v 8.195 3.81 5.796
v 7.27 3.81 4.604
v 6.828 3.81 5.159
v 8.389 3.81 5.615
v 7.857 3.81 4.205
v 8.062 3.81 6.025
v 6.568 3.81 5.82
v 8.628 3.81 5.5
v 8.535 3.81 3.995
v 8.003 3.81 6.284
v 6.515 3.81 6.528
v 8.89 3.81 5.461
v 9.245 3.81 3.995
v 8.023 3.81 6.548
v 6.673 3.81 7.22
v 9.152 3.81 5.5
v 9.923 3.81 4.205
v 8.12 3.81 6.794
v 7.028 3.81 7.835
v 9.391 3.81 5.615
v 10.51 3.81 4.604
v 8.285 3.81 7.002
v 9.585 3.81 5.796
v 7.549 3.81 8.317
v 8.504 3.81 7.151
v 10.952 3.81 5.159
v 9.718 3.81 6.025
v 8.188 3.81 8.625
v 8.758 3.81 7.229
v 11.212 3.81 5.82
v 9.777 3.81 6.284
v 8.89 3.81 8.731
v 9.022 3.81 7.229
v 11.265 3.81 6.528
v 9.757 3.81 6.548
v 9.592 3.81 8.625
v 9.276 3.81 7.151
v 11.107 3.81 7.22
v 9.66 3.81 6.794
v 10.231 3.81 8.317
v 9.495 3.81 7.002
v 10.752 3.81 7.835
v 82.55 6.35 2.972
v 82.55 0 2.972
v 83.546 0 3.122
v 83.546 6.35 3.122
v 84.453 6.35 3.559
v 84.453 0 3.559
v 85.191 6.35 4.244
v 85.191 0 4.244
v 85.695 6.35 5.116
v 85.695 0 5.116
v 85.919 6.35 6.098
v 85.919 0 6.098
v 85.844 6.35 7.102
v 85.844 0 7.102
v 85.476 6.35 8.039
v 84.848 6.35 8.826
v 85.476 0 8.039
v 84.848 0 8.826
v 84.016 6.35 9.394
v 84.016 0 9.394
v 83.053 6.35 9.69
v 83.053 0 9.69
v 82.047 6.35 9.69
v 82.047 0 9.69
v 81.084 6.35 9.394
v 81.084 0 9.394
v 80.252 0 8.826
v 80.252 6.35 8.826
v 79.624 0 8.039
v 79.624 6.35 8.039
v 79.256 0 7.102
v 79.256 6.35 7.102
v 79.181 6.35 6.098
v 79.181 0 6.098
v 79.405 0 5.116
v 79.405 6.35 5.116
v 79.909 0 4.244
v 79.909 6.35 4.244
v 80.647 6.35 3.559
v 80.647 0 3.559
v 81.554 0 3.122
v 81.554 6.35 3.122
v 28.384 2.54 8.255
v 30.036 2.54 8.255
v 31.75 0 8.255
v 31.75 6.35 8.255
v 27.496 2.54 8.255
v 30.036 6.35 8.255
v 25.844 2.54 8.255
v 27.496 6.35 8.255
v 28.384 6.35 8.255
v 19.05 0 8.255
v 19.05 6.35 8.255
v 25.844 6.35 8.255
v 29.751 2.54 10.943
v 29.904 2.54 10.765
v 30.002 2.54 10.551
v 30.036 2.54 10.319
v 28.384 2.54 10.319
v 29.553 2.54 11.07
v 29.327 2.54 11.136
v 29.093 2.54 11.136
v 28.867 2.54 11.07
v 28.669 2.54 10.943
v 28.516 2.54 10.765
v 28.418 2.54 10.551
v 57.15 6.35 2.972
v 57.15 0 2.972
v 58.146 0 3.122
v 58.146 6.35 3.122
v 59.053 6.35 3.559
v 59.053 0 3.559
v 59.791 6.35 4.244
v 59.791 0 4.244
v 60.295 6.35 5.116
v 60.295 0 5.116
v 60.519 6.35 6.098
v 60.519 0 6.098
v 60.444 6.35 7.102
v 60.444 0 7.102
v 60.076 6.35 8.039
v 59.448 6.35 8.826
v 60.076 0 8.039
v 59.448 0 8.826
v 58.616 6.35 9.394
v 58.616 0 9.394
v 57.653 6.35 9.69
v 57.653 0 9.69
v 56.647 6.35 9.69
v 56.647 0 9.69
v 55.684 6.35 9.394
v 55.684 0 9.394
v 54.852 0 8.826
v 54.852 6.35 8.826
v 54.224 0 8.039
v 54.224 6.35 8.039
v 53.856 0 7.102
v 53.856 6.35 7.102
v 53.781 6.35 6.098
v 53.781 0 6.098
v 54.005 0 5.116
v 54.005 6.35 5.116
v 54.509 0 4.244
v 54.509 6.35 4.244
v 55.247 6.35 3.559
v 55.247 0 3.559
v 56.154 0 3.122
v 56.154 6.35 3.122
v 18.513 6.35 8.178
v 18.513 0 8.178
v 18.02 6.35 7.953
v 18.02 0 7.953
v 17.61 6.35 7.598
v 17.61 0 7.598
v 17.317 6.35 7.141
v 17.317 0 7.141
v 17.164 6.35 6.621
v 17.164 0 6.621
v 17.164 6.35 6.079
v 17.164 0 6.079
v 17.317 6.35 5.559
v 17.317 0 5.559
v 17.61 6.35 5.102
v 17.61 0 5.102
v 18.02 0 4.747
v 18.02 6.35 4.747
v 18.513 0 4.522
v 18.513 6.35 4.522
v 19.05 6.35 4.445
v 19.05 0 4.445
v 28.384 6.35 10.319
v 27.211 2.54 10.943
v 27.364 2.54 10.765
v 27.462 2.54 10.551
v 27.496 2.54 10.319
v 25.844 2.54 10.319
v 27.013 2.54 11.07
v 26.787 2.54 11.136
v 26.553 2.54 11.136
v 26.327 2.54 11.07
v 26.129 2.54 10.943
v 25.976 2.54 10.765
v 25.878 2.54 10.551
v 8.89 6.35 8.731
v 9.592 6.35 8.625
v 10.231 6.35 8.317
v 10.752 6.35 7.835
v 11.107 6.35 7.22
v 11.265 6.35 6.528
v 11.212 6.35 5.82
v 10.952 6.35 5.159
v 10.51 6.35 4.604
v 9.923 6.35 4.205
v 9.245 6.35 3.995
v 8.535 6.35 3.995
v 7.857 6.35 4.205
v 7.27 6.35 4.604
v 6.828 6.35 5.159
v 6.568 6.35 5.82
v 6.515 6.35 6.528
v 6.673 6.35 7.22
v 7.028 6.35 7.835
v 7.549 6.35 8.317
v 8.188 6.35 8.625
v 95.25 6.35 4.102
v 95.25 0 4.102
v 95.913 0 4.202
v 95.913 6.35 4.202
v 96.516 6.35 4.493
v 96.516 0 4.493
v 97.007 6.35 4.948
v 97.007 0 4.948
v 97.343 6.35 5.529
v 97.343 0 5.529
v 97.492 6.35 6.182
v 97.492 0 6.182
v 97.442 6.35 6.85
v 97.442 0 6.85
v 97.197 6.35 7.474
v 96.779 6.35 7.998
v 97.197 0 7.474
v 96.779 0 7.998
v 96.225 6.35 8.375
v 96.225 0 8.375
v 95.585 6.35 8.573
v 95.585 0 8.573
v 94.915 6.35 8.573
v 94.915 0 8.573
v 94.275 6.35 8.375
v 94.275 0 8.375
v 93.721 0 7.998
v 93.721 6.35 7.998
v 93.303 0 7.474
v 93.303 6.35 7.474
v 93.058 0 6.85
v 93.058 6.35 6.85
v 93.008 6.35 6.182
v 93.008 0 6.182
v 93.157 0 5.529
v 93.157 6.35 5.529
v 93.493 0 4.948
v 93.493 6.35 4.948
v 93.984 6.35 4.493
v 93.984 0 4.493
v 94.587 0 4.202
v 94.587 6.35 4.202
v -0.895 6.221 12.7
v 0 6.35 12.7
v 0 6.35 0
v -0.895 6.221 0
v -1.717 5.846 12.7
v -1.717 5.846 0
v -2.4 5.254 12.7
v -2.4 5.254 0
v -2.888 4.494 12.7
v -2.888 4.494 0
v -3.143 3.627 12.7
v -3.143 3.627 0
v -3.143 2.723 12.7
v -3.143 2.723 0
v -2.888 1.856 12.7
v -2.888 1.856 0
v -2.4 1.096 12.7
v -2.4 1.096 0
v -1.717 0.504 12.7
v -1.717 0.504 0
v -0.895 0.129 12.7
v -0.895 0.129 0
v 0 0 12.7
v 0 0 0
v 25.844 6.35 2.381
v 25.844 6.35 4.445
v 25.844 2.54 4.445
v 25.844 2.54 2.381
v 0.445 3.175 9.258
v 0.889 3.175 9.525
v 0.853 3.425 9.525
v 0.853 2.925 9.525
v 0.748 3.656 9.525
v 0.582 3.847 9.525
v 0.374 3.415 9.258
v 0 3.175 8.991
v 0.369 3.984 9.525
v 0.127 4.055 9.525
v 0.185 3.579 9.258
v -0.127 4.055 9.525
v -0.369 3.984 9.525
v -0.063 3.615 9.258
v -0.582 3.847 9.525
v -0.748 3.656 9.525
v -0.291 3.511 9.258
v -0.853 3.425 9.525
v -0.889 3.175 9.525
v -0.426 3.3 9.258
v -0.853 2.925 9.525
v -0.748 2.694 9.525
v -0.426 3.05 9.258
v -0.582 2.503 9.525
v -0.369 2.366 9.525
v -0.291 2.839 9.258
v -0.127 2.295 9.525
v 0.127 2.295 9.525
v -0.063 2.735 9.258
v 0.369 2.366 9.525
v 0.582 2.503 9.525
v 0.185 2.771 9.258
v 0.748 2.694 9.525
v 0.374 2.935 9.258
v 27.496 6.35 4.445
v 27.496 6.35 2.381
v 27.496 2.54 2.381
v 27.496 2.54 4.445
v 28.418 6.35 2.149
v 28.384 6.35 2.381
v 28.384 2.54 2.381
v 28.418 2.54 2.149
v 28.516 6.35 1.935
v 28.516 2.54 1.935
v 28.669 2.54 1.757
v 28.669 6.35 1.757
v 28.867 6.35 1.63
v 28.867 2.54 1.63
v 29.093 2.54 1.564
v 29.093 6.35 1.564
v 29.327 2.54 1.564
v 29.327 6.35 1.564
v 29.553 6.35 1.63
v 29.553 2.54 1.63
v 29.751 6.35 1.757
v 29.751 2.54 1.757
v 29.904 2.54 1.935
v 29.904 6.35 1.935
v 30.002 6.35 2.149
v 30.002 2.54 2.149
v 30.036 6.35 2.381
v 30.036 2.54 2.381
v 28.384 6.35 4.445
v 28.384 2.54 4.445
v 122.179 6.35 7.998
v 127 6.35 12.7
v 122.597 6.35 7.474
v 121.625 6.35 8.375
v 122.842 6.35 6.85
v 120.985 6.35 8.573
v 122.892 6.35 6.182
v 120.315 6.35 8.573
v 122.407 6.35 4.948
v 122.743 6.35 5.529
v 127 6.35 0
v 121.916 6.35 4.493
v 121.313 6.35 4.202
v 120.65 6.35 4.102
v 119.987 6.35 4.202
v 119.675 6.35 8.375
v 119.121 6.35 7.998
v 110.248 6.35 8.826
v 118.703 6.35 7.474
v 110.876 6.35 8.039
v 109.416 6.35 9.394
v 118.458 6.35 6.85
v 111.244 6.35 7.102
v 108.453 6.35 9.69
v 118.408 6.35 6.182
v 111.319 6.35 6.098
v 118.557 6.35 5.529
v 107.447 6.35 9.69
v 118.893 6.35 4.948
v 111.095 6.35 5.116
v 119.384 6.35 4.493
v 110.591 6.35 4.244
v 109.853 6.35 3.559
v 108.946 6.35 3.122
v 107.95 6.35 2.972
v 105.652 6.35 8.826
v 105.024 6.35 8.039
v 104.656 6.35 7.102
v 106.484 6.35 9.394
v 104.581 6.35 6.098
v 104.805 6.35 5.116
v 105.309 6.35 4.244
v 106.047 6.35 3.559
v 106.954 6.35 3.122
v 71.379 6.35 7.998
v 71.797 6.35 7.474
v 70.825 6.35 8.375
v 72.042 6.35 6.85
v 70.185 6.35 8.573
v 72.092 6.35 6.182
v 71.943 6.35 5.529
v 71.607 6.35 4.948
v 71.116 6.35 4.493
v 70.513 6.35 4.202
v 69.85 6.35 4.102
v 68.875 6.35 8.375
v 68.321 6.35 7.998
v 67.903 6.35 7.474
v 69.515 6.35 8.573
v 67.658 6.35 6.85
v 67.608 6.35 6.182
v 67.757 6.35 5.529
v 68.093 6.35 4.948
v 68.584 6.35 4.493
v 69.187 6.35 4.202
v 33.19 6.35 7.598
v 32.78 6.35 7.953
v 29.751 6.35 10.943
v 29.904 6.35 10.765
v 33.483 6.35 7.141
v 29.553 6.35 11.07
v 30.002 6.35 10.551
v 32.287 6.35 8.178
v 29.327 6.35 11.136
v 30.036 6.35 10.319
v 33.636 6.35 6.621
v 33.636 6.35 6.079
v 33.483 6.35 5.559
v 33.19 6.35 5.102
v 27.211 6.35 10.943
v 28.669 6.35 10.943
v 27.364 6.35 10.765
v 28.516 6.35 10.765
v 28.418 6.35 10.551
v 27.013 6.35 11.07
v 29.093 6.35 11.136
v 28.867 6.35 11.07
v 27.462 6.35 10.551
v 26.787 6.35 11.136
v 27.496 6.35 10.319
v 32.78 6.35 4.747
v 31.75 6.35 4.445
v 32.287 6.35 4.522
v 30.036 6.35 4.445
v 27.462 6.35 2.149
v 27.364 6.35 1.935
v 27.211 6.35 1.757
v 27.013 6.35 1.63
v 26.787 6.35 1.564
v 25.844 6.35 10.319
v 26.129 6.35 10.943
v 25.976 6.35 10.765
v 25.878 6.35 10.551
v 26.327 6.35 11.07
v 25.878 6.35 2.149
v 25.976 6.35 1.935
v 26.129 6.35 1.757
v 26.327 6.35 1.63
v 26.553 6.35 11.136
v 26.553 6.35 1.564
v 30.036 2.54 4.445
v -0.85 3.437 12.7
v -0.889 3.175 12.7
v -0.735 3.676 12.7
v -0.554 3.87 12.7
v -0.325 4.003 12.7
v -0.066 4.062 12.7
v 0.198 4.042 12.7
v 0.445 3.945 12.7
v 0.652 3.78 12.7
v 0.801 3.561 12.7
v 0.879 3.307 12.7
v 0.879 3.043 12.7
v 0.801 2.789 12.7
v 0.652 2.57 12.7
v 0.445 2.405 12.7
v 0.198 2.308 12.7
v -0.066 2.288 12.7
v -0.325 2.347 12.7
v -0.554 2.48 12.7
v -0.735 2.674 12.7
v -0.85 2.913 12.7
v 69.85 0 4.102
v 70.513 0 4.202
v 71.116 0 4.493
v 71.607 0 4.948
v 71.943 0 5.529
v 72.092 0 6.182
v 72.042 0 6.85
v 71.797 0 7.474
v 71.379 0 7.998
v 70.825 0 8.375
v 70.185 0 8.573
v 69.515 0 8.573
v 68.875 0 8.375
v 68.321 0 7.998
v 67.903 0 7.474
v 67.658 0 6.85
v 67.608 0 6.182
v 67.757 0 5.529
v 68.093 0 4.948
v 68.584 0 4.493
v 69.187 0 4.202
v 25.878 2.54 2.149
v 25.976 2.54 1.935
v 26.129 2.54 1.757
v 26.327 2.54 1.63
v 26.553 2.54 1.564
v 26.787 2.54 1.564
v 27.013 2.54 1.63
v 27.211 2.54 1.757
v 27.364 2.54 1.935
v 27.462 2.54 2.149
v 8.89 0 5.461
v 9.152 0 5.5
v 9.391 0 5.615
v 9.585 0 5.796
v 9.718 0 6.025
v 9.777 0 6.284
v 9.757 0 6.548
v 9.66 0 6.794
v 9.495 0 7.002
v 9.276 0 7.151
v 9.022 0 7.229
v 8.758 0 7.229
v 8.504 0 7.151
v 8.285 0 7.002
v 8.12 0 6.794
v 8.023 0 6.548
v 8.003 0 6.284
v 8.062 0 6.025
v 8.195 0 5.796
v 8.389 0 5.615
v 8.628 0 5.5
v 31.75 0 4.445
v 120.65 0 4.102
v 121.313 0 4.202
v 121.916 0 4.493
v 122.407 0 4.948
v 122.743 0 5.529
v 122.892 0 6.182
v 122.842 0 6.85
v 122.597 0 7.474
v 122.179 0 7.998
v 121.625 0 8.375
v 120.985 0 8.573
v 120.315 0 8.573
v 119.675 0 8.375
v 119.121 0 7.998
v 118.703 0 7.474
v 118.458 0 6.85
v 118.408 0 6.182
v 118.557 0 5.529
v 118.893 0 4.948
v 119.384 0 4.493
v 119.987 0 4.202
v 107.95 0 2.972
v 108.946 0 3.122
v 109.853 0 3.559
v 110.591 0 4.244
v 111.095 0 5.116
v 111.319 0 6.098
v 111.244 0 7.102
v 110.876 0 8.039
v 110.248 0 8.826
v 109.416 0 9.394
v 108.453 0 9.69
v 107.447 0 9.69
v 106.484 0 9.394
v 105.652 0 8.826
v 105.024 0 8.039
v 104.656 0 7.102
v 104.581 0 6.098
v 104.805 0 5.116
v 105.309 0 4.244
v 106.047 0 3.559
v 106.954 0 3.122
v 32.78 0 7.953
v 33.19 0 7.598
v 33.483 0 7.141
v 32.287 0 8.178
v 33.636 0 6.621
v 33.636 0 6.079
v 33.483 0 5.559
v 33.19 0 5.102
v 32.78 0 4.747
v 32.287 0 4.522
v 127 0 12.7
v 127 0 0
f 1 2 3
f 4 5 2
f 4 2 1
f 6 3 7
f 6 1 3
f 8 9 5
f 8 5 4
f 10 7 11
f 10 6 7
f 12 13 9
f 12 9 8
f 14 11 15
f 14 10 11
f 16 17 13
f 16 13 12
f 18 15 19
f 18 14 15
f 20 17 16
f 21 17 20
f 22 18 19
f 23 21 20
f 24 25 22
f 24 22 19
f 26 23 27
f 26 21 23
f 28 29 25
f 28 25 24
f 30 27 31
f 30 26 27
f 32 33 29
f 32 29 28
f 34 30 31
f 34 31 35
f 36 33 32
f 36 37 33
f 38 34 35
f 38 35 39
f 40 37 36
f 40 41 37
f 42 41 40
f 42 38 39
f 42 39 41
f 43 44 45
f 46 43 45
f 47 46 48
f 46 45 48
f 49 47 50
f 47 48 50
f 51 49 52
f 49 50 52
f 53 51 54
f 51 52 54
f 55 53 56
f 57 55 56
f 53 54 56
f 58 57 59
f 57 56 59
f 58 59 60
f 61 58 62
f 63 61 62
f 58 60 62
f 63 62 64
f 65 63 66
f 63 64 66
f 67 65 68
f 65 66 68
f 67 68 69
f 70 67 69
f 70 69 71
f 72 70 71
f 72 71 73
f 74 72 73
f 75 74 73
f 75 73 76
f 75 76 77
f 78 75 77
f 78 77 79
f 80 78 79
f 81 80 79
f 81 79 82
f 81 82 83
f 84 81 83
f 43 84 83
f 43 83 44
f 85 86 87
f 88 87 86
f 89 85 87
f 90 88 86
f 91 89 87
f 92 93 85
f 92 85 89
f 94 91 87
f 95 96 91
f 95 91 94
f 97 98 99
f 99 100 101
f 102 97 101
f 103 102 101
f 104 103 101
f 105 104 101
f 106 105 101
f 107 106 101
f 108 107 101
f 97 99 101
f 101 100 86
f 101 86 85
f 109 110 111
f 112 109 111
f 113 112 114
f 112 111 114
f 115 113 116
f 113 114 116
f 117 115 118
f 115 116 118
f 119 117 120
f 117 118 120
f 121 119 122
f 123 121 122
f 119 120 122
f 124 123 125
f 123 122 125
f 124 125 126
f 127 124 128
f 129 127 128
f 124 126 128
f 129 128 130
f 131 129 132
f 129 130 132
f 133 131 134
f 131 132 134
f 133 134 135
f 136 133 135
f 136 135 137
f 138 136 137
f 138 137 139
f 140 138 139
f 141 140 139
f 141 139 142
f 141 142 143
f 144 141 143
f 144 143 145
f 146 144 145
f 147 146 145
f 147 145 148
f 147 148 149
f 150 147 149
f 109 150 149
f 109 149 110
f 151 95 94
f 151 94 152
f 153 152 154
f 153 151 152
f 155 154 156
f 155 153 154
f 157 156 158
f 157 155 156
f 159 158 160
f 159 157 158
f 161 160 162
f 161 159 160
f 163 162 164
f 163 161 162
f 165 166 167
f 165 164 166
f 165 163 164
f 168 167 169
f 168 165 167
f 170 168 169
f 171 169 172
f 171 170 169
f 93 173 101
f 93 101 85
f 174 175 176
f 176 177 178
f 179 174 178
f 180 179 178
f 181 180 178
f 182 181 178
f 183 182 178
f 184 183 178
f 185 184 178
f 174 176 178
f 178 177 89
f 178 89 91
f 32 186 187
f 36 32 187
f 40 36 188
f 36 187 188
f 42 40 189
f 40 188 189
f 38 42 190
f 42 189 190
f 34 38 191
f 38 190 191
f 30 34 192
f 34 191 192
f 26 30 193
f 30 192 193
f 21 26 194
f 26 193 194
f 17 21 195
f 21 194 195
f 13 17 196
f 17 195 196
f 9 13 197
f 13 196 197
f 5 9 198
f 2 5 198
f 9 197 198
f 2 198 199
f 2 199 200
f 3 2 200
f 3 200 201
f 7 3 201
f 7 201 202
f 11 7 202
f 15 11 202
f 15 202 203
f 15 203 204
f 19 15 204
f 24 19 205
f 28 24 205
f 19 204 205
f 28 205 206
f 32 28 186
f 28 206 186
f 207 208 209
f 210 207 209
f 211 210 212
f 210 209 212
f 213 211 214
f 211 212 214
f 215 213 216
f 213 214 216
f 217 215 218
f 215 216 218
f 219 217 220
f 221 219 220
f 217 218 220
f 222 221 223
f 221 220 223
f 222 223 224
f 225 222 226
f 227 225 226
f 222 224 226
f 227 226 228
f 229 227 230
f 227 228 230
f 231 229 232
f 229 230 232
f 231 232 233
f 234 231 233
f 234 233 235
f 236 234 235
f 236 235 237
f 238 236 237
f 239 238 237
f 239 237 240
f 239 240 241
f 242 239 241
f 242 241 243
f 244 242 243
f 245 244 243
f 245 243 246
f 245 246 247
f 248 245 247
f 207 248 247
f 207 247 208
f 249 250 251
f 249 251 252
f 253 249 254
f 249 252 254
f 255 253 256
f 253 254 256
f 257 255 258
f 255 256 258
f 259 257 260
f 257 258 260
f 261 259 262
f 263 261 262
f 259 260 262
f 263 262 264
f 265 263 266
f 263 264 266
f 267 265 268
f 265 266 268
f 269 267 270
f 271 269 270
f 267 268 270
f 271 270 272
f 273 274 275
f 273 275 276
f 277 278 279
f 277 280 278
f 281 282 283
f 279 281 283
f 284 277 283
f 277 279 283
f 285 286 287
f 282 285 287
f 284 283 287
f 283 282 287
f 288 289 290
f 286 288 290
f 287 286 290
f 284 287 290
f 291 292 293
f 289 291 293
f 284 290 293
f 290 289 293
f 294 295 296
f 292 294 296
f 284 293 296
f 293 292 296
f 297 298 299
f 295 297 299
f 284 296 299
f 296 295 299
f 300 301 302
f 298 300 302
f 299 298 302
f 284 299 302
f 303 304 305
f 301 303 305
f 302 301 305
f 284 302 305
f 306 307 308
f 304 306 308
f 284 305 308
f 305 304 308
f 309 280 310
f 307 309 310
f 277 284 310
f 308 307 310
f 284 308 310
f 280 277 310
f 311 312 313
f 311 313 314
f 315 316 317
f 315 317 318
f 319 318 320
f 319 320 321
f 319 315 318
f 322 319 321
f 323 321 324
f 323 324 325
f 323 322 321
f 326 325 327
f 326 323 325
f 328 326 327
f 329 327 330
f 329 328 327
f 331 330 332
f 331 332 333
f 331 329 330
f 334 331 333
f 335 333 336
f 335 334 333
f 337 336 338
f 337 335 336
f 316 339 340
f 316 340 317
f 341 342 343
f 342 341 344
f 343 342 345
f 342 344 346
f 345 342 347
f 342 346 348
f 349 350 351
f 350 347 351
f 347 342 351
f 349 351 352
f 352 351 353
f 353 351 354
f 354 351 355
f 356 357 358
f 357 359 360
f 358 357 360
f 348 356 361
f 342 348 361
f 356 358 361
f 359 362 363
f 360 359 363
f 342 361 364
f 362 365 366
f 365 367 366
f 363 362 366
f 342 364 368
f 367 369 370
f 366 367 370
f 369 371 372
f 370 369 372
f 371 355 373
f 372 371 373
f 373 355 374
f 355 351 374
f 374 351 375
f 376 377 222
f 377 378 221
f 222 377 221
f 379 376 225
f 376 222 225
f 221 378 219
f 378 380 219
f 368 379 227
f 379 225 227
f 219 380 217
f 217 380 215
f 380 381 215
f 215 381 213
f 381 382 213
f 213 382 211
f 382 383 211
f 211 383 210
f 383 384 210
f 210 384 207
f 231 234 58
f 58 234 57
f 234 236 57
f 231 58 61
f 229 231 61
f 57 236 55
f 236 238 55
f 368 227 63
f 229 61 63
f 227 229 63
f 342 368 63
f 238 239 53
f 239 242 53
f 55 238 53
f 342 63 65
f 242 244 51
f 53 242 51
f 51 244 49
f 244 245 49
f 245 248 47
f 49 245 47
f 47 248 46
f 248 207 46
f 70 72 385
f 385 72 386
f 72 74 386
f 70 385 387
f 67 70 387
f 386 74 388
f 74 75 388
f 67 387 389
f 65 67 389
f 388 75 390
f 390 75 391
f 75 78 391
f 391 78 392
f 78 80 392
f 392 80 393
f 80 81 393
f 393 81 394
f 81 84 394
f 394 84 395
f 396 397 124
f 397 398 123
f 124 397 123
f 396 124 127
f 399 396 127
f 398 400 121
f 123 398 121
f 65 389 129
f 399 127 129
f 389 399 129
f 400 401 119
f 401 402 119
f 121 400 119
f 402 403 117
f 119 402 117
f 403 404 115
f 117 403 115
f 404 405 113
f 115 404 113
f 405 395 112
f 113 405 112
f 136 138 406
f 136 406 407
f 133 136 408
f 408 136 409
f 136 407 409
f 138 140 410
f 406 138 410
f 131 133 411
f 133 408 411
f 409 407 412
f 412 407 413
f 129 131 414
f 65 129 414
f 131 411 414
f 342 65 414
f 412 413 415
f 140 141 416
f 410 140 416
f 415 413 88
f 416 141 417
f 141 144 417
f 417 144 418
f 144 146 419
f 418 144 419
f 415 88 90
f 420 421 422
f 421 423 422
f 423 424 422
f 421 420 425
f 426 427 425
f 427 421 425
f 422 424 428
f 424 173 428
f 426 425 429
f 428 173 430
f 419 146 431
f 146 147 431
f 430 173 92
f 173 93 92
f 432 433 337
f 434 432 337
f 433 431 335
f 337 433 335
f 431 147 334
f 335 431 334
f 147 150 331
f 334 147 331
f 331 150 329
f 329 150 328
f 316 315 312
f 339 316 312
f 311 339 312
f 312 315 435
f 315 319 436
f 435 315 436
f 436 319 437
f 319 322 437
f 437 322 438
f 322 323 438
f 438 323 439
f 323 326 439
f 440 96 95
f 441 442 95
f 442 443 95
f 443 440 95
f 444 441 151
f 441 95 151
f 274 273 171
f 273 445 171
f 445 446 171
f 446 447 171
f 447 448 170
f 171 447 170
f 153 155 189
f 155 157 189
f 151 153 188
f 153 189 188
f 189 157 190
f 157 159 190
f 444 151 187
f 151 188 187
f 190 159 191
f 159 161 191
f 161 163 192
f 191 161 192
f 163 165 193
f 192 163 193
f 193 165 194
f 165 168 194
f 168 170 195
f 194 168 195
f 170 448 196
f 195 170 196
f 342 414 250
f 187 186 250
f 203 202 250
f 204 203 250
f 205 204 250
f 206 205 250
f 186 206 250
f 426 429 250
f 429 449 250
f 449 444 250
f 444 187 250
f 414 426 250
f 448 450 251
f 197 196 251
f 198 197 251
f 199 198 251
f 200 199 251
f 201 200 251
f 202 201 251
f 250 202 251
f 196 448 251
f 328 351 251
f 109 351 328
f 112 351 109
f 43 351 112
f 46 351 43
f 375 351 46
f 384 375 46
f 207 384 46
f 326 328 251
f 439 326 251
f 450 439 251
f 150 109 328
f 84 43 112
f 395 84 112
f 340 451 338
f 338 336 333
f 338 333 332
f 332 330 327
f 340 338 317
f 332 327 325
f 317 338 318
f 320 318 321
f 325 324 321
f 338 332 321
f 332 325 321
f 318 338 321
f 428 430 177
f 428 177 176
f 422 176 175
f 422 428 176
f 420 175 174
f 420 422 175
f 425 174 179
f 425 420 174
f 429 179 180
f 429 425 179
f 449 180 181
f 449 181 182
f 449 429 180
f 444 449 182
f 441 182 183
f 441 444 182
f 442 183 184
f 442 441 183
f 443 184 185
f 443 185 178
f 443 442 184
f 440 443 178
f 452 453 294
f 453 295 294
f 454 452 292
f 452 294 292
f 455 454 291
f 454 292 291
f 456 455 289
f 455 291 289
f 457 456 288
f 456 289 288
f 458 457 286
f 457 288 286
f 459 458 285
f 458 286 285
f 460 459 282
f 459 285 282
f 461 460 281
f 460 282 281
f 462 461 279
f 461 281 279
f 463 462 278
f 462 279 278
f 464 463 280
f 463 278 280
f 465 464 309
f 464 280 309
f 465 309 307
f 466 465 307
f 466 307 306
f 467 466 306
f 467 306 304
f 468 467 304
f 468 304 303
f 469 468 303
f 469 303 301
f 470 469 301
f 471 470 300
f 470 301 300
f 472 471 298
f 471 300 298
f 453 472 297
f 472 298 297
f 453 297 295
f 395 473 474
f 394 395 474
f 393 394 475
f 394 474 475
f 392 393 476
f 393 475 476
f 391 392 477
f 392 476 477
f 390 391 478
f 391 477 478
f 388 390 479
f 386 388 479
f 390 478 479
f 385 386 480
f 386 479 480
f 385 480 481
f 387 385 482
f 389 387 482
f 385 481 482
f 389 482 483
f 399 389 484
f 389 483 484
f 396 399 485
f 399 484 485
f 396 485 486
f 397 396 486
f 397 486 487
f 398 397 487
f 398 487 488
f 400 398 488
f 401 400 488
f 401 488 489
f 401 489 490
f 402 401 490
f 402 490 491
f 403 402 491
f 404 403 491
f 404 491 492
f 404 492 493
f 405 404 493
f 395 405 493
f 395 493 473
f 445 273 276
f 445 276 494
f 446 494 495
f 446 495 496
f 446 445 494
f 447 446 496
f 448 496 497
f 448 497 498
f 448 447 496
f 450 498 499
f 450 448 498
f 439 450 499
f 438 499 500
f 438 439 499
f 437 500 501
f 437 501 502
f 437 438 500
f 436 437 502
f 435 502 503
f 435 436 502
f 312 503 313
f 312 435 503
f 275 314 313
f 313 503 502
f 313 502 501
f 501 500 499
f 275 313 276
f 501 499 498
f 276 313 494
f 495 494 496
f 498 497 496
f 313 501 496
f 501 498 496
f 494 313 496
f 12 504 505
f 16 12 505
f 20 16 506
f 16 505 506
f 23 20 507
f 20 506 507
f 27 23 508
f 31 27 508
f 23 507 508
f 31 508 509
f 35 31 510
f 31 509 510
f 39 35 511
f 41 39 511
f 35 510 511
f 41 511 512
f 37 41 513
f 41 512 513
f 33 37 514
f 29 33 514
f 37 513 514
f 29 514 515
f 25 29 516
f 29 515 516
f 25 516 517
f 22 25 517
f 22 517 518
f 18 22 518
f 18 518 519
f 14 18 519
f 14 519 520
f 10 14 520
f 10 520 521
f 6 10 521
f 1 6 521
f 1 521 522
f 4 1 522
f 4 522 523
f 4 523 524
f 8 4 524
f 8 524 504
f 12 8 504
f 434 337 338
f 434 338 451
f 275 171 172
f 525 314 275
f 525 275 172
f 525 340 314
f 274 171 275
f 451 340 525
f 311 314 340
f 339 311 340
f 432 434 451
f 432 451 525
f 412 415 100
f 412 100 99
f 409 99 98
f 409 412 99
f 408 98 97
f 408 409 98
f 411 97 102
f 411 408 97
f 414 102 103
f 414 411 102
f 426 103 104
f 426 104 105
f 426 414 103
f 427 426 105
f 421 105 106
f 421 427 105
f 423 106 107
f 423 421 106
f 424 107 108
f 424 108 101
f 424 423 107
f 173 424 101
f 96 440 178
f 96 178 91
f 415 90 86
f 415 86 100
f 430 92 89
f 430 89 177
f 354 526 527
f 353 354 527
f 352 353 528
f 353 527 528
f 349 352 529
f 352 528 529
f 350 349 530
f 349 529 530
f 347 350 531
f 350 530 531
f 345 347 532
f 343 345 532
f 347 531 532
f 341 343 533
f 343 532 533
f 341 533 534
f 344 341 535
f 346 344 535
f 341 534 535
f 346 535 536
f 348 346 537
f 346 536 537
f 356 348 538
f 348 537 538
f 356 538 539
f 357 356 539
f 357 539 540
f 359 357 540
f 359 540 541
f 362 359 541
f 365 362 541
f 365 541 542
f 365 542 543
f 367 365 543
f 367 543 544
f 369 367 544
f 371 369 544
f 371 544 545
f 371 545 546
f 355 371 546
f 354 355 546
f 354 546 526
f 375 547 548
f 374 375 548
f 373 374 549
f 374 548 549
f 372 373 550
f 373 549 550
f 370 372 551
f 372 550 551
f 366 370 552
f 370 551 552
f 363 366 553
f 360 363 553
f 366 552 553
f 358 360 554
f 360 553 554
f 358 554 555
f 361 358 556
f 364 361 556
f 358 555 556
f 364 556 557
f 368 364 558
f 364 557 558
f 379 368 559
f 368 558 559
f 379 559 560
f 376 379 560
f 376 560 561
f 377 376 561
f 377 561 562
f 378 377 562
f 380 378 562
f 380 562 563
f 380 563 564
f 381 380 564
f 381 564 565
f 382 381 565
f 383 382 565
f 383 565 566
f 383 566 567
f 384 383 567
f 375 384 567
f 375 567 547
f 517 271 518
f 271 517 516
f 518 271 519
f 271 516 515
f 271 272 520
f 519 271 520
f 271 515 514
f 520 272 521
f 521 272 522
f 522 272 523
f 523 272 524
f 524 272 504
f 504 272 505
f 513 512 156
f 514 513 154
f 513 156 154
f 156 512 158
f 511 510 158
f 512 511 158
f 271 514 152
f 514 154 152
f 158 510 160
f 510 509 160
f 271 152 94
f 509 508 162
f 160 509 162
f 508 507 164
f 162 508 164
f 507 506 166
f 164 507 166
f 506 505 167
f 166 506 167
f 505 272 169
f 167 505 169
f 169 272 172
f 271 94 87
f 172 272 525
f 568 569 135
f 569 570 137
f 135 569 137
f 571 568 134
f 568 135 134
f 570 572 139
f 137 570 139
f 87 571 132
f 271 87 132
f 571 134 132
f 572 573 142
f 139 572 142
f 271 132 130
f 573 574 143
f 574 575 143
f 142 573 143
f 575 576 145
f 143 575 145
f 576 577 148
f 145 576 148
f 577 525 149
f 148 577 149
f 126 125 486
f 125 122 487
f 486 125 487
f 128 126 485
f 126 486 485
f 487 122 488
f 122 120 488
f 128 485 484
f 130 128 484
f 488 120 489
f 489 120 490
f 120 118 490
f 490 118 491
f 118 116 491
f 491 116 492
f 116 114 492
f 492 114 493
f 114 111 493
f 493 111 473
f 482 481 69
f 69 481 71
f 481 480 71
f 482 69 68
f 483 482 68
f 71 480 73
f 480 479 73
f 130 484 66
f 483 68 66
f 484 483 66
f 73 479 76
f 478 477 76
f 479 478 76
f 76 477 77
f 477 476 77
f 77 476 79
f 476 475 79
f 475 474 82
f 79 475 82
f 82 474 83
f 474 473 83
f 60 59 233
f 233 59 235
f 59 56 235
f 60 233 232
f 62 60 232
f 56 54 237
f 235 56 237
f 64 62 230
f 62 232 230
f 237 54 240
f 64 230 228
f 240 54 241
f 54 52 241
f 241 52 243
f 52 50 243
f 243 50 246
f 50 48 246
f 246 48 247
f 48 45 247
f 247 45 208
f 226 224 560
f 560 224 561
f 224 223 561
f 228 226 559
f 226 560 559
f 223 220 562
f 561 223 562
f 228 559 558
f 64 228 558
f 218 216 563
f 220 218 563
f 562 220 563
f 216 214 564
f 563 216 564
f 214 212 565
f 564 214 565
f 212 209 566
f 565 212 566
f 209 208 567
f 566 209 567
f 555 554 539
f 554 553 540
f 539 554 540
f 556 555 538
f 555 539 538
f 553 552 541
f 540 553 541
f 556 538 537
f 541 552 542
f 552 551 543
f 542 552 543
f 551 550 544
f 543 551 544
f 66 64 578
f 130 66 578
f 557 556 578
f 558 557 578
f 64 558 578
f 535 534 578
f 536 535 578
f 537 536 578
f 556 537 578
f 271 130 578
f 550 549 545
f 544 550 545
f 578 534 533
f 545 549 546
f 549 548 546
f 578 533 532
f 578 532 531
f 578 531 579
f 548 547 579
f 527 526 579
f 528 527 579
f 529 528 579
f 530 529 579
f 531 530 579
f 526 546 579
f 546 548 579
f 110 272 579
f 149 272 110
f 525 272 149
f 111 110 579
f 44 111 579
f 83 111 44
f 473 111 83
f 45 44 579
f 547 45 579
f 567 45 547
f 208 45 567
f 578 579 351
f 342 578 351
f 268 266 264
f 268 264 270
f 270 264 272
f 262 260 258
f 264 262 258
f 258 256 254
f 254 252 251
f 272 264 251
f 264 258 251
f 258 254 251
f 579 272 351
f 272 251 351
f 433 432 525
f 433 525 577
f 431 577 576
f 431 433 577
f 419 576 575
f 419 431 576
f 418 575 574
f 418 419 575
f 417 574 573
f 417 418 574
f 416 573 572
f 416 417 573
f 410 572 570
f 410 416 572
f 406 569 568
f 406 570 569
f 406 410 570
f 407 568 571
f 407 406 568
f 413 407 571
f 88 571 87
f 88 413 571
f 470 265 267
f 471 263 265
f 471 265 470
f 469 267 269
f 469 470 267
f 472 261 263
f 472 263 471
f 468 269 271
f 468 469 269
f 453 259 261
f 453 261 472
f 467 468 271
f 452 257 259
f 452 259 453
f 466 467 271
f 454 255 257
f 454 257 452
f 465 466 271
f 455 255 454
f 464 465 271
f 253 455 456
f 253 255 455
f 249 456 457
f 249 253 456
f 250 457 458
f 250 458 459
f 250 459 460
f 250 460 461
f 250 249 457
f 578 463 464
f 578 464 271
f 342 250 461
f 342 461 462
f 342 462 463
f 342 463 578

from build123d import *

# Parameters (mm, degrees)
BOSS_EXTRUDE1_DEPTH       = 12.7
F_2_56_TAPPED_HOLE1_D     = 1.778
F_2_56_TAPPED_HOLE1_DEPTH = 3.175
F_2_56_TAPPED_HOLE1_TIP   = 0.53416509
CUT_EXTRUDE1_DEPTH        = 128.791284914
CUT_EXTRUDE2_DEPTH        = 3.81
F_2_56_TAPPED_HOLE2_D     = 1.778
F_8_CLEARANCE_HOLE1_D     = 4.4958
F_1_4_CLEARANCE_HOLE1_D   = 6.7564
LPATTERN1_COUNT           = 3
LPATTERN1_PITCH           = 25.4
SKETCH11_R                = 2.38125
CUT_EXTRUDE3_DEPTH        = 2.54


with BuildPart() as part:
    # Sketch1 → Boss-Extrude1 (new body)
    with BuildSketch(Plane.XY):
        with BuildLine():
            Line((0, 0), (127, 0))
            Line((127, 0), (127, 6.35))
            Line((127, 6.35), (0, 6.35))
            ThreePointArc((0, 6.35), (-3.175, 3.175), (0, 0))
        make_face()
    extrude(amount=BOSS_EXTRUDE1_DEPTH)

    # #2-56 Tapped Hole1
    with Locations(Plane(origin=(0, 3.175, 12.7), x_dir=(1, 0, 0), z_dir=(0, 0, 1))):
        with Locations((0, 0)):
            Hole(F_2_56_TAPPED_HOLE1_D / 2, depth=F_2_56_TAPPED_HOLE1_DEPTH)
            with Locations((0, 0, -(F_2_56_TAPPED_HOLE1_DEPTH + F_2_56_TAPPED_HOLE1_TIP / 2))):  # 118° drill point
                Cone(0, F_2_56_TAPPED_HOLE1_D / 2, F_2_56_TAPPED_HOLE1_TIP, mode=Mode.SUBTRACT)

    # Sketch6 → Cut-Extrude1 (cut, through all)
    with BuildSketch(Plane(origin=(0, 6.35, 0), x_dir=(1, 0, 0), z_dir=(0, 1, 0))):
        with BuildLine():
            Line((19.05, -4.445), (31.75, -4.445))
            ThreePointArc((31.75, -4.445), (33.655, -6.35), (31.75, -8.255))
            Line((31.75, -8.255), (19.05, -8.255))
            ThreePointArc((19.05, -8.255), (17.145, -6.35), (19.05, -4.445))
        make_face()
    extrude(amount=-CUT_EXTRUDE1_DEPTH, mode=Mode.SUBTRACT)

    # Sketch7 → Cut-Extrude2 (cut)
    with BuildSketch(Plane(origin=(0, 6.35, 0), x_dir=(1, 0, 0), z_dir=(0, 1, 0))):
        with BuildLine():
            Line((28.3845, -10.31875), (28.3845, -2.38125))
            ThreePointArc((28.3845, -2.38125), (29.21, -1.55575), (30.0355, -2.38125))
            Line((30.0355, -2.38125), (30.0355, -10.31875))
            ThreePointArc((30.0355, -10.31875), (29.21, -11.14425), (28.3845, -10.31875))
        make_face()
        with BuildLine():
            Line((25.8445, -10.31875), (25.8445, -2.38125))
            ThreePointArc((25.8445, -2.38125), (26.67, -1.55575), (27.4955, -2.38125))
            Line((27.4955, -2.38125), (27.4955, -10.31875))
            ThreePointArc((27.4955, -10.31875), (26.67, -11.14425), (25.8445, -10.31875))
        make_face()
    extrude(amount=-CUT_EXTRUDE2_DEPTH, mode=Mode.SUBTRACT)

    # #2-56 Tapped Hole2 (through all)
    with Locations(Plane(origin=(8.89, 6.35, 6.35), x_dir=(0, 0, 1), z_dir=(0, 1, 0))):
        with Locations((0, 0)):
            Hole(F_2_56_TAPPED_HOLE2_D / 2)

    # #8 Clearance Hole1 (through all)
    with Locations(Plane(origin=(120.65, 6.35, 6.35), x_dir=(0, 0, 1), z_dir=(0, 1, 0))):
        with Locations((0, 0)):
            f_8_clearance_hole1 = Hole(F_8_CLEARANCE_HOLE1_D / 2)

    # 1/4 Clearance Hole1 (through all)
    with Locations(Plane(origin=(107.95, 6.35, 6.35), x_dir=(0, 0, 1), z_dir=(0, 1, 0))):
        with Locations((0, 0)):
            f_1_4_clearance_hole1 = Hole(F_1_4_CLEARANCE_HOLE1_D / 2)

    # LPattern1: #8 Clearance Hole1, 1/4 Clearance Hole1 ×3
    with Locations(*[(-i * LPATTERN1_PITCH, 0, 0) for i in range(1, LPATTERN1_COUNT)]):
        add(f_8_clearance_hole1, mode=Mode.SUBTRACT)
        add(f_1_4_clearance_hole1, mode=Mode.SUBTRACT)

    # Sketch11 → Cut-Extrude3 (cut)
    with BuildSketch(Plane(origin=(0, 6.35, 0), x_dir=(1, 0, 0), z_dir=(0, 1, 0))):
        with Locations(Location((8.89, -6.35, 0), (0, 0, 270))):
            Circle(SKETCH11_R)
    extrude(amount=-CUT_EXTRUDE3_DEPTH, mode=Mode.SUBTRACT)


solid = part.part
